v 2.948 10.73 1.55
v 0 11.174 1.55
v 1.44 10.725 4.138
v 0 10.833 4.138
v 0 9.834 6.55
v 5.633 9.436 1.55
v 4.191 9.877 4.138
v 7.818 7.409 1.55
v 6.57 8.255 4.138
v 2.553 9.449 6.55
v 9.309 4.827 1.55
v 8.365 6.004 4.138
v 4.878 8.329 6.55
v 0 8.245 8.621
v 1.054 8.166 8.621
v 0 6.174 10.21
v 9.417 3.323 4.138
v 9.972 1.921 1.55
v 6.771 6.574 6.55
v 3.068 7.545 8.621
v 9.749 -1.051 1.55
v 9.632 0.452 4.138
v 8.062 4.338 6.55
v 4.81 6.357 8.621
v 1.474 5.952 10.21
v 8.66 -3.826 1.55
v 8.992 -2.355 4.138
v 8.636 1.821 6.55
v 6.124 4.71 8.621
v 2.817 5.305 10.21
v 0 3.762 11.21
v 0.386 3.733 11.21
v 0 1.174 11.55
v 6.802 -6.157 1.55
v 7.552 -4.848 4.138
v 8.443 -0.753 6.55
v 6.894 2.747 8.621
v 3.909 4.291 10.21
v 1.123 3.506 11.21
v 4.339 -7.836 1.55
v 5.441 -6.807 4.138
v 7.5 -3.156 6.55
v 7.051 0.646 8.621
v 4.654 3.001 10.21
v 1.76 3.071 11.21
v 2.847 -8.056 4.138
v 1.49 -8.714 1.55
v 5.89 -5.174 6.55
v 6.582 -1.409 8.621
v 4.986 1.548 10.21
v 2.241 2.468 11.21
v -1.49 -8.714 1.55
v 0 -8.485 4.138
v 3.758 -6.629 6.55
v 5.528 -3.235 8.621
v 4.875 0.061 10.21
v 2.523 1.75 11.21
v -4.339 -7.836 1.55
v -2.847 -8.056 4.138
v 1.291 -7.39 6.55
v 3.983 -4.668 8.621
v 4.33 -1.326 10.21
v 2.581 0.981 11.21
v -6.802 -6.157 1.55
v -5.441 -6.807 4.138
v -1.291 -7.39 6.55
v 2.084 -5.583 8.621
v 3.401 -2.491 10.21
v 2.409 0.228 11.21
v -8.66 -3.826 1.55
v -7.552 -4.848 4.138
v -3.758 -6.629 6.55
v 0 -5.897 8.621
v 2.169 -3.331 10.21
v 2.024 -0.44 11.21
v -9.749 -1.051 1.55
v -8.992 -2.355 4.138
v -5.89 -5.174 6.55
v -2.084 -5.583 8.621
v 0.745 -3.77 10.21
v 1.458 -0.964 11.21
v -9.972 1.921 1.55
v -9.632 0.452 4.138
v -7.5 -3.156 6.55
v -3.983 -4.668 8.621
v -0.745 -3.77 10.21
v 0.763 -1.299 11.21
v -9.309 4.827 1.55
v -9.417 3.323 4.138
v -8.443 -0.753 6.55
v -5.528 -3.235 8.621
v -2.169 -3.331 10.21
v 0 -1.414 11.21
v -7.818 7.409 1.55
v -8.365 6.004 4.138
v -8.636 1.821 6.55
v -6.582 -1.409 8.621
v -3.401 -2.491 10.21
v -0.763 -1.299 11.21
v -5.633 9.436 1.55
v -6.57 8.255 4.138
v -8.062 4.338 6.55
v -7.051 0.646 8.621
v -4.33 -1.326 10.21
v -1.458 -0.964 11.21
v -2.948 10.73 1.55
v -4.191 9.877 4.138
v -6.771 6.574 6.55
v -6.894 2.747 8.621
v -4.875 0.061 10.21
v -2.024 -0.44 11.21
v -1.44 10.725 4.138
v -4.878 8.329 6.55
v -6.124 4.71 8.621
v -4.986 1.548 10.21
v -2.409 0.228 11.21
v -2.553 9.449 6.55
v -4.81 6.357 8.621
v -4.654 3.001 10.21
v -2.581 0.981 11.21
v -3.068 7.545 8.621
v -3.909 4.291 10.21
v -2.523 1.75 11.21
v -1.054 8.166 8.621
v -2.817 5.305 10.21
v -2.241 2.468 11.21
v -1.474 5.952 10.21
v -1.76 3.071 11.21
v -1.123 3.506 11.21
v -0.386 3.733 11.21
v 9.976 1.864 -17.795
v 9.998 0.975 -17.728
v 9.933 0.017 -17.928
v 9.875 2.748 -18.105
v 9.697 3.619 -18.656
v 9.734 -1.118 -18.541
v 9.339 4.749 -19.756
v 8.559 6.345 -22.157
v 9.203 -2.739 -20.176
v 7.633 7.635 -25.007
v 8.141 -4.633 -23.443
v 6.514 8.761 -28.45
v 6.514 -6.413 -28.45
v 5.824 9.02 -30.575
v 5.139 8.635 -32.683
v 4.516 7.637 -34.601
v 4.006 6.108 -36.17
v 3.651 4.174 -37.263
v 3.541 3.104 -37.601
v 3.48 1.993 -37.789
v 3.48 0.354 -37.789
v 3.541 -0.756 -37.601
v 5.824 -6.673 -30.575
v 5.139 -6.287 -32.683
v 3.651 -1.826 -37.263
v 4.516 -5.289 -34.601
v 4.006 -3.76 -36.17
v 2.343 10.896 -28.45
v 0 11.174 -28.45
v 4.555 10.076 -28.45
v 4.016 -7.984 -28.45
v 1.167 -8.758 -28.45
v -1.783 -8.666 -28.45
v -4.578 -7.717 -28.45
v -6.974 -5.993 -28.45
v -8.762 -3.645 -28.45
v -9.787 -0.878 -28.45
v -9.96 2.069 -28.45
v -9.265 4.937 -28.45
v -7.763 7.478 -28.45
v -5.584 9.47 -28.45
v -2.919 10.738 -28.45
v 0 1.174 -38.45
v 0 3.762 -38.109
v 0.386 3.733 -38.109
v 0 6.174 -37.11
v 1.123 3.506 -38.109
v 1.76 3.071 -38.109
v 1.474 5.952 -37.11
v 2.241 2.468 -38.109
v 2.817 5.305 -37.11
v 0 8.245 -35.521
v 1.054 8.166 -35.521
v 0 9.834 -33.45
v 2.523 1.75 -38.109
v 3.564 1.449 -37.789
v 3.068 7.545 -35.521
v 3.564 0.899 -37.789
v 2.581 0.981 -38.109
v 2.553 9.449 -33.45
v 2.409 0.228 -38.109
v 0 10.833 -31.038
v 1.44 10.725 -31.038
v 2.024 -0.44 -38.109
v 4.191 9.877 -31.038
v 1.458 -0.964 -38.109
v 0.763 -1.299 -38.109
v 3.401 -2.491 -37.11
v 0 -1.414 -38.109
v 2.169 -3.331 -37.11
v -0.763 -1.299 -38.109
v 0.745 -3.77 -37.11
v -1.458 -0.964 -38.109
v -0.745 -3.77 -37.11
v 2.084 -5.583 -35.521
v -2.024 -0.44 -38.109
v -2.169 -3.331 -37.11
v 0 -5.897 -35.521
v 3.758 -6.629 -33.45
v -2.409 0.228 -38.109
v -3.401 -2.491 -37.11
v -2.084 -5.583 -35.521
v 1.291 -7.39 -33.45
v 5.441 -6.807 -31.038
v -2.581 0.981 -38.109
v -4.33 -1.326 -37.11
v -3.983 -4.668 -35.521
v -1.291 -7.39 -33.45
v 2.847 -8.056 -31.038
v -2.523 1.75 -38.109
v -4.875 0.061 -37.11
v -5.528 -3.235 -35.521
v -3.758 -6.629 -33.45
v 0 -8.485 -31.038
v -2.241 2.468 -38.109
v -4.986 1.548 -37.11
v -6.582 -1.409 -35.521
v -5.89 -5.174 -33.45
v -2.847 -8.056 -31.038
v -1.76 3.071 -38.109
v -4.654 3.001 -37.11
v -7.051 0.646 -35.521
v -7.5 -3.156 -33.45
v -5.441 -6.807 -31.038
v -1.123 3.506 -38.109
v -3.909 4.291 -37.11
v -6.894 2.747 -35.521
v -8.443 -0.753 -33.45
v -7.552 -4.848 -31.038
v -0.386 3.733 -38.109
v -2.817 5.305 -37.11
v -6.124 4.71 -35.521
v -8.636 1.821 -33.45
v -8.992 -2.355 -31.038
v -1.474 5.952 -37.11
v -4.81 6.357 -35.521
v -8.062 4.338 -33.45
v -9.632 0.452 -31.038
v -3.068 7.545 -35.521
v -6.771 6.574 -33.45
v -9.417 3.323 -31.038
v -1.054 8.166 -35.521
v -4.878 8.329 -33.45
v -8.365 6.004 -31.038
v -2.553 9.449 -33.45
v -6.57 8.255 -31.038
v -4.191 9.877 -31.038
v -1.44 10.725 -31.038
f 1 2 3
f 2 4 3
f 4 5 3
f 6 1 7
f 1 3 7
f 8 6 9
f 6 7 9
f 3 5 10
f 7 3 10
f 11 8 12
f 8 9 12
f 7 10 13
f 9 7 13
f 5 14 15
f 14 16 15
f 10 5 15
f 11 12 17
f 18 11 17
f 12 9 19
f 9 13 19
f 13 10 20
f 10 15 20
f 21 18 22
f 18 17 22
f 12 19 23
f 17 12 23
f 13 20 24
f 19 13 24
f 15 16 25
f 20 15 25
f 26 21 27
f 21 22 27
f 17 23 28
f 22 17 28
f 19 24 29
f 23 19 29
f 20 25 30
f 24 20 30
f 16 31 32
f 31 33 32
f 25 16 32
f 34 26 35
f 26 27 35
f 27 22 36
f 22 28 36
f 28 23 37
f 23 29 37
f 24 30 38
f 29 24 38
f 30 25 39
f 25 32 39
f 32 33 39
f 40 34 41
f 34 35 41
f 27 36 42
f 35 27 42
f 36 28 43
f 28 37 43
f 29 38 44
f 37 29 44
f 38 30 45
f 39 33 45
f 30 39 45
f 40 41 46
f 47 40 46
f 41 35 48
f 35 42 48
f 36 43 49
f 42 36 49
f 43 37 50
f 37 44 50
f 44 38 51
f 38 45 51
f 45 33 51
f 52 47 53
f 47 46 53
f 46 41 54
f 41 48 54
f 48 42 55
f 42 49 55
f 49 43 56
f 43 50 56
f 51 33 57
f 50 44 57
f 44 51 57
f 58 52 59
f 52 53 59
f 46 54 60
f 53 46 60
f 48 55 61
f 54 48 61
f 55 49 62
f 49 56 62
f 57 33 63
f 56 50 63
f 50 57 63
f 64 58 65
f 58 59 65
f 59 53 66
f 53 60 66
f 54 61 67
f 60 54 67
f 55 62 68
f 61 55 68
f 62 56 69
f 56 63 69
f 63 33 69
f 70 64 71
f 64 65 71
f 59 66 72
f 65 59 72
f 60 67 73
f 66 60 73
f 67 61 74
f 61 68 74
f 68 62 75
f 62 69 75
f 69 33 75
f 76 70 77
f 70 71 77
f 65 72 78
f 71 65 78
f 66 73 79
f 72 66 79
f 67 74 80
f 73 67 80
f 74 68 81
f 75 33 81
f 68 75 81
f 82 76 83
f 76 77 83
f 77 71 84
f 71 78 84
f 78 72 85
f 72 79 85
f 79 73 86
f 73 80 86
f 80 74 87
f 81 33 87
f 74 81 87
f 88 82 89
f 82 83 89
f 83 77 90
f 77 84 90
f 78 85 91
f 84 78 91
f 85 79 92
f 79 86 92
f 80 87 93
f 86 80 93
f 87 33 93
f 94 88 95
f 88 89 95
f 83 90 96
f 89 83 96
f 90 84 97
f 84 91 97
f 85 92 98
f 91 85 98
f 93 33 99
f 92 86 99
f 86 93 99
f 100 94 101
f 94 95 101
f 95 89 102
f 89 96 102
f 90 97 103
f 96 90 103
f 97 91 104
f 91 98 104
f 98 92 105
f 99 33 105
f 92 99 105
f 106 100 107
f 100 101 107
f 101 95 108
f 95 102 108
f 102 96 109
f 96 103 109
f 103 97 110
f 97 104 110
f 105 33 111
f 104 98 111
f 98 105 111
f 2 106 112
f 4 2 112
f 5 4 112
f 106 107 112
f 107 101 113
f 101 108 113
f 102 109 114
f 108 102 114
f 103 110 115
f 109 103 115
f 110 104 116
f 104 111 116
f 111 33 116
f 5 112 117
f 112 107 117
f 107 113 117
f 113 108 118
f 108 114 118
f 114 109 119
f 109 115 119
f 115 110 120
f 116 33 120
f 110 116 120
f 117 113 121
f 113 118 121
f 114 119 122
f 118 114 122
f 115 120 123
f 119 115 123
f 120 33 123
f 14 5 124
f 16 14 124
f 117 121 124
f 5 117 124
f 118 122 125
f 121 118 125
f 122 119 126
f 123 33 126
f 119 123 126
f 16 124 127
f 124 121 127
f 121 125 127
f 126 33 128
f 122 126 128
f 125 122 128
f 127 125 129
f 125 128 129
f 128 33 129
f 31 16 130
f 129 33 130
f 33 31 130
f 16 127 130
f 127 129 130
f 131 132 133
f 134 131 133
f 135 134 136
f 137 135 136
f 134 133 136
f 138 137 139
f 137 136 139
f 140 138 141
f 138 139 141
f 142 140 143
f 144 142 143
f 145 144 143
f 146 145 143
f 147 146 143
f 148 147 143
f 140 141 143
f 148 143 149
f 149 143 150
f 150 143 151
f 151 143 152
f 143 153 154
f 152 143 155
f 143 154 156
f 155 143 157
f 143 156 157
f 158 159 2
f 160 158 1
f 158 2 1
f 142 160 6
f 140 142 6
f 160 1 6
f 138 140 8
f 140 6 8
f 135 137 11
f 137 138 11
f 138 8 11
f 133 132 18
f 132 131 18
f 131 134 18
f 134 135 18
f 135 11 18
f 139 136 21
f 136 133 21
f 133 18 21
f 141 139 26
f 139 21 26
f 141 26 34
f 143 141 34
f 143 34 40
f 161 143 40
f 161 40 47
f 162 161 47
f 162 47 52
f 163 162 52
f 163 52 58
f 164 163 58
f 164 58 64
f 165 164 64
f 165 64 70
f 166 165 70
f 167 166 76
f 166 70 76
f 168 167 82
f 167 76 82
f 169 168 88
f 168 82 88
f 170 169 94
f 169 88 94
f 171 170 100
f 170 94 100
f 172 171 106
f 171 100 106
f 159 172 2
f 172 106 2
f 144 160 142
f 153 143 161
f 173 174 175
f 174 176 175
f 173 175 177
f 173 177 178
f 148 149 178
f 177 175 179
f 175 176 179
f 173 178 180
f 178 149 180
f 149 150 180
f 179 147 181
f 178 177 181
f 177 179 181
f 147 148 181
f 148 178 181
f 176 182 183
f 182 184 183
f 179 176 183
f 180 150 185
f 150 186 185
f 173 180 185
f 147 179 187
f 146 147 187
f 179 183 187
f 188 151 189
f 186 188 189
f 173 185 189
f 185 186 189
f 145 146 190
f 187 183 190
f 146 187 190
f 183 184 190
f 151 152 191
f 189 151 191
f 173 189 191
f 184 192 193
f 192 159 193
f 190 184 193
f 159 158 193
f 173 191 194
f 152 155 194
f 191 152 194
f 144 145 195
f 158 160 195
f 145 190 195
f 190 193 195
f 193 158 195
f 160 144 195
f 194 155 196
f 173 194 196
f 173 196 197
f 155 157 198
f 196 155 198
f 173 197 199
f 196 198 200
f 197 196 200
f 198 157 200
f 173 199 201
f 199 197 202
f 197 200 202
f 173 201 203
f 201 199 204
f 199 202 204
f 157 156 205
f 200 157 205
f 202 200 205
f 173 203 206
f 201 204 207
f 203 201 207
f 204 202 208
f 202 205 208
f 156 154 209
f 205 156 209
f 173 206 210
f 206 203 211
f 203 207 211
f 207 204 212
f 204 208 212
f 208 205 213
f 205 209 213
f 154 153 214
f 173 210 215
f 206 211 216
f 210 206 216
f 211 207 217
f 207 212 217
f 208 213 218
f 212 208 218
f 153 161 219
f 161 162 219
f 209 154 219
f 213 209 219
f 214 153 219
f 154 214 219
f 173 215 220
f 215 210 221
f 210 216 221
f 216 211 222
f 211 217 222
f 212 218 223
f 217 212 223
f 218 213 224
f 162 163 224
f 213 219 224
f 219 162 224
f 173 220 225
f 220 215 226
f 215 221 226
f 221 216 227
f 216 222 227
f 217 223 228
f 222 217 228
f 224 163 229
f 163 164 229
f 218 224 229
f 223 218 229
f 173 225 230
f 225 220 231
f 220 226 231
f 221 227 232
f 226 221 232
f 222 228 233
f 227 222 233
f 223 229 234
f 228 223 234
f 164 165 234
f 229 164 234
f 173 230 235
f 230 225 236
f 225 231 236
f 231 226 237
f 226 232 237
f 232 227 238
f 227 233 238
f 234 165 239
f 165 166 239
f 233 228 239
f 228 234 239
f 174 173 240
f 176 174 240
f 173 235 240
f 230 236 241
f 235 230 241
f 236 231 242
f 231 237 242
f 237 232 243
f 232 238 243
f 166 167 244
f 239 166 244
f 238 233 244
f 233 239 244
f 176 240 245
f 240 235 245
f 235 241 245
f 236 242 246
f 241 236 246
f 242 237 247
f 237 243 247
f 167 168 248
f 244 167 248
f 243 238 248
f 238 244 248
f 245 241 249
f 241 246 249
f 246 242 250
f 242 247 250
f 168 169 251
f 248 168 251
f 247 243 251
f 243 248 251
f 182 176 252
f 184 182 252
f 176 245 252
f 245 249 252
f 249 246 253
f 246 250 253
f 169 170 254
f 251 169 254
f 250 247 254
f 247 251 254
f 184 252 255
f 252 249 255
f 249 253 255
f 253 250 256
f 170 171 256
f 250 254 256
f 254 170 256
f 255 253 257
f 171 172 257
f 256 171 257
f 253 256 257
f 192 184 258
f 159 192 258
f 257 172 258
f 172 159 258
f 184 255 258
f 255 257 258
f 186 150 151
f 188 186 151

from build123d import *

# Parameters (mm, degrees)
F3_DEPTH = 67


with BuildPart() as f1:
    # F0 (on Right) → F1 (revolve)
    with BuildSketch(Plane.YZ):
        with BuildLine():
            ThreePointArc((-152.8260280422, -8.4497542544), (-145.7549602303, -5.5208220662), (-142.8260280422, 1.5502457456))
            ThreePointArc((-142.8260280422, 1.5502457456), (-145.7549602303, 8.6213135575), (-152.8260280422, 11.5502457456))
            Line((-152.8260280422, 11.5502457456), (-152.8260280422, -8.4497542544))
        make_face()
        with BuildLine():
            Line((-142.8260280422, -28.4497542544), (-142.8260280422, 1.5502457456))
            ThreePointArc((-142.8260280422, 1.5502457456), (-145.7549602303, -5.5208220662), (-152.8260280422, -8.4497542544))
            Line((-152.8260280422, -8.4497542544), (-152.8260280422, -18.4497542544))
            ThreePointArc((-152.8260280422, -18.4497542544), (-145.7549602303, -21.3786864425), (-142.8260280422, -28.4497542544))
        make_face()
        with BuildLine():
            ThreePointArc((-152.8260280422, -38.4497542544), (-145.7549602303, -35.5208220662), (-142.8260280422, -28.4497542544))
            ThreePointArc((-142.8260280422, -28.4497542544), (-145.7549602303, -21.3786864425), (-152.8260280422, -18.4497542544))
            Line((-152.8260280422, -18.4497542544), (-152.8260280422, -38.4497542544))
        make_face()
    revolve(axis=Axis((0, -152.8260280422, -13.4497542544), (0, 0, -1)))


with BuildPart() as f3:
    # F2 (on Front) → F3 (new body)
    with BuildSketch(Plane.XZ):
        Polygon((10.0054517388, -37.7888888825), (10.0054517388, -17.7050014576), (3.4798011376, -37.7888888825), align=None)
    extrude(amount=-F3_DEPTH)


with BuildPart() as f1_1:
    # F4: moved
    add(f1.part.moved(Location((0, 154, 0))))


with BuildPart() as f3_1:
    # F5: moved
    add(f3.part.moved(Location((0, -25, 0))))


with BuildPart() as f1_2:
    add(f1_1.part)

    # F6: cut F3
    add(f3_1.part, mode=Mode.SUBTRACT)


solid = f1_2.part
